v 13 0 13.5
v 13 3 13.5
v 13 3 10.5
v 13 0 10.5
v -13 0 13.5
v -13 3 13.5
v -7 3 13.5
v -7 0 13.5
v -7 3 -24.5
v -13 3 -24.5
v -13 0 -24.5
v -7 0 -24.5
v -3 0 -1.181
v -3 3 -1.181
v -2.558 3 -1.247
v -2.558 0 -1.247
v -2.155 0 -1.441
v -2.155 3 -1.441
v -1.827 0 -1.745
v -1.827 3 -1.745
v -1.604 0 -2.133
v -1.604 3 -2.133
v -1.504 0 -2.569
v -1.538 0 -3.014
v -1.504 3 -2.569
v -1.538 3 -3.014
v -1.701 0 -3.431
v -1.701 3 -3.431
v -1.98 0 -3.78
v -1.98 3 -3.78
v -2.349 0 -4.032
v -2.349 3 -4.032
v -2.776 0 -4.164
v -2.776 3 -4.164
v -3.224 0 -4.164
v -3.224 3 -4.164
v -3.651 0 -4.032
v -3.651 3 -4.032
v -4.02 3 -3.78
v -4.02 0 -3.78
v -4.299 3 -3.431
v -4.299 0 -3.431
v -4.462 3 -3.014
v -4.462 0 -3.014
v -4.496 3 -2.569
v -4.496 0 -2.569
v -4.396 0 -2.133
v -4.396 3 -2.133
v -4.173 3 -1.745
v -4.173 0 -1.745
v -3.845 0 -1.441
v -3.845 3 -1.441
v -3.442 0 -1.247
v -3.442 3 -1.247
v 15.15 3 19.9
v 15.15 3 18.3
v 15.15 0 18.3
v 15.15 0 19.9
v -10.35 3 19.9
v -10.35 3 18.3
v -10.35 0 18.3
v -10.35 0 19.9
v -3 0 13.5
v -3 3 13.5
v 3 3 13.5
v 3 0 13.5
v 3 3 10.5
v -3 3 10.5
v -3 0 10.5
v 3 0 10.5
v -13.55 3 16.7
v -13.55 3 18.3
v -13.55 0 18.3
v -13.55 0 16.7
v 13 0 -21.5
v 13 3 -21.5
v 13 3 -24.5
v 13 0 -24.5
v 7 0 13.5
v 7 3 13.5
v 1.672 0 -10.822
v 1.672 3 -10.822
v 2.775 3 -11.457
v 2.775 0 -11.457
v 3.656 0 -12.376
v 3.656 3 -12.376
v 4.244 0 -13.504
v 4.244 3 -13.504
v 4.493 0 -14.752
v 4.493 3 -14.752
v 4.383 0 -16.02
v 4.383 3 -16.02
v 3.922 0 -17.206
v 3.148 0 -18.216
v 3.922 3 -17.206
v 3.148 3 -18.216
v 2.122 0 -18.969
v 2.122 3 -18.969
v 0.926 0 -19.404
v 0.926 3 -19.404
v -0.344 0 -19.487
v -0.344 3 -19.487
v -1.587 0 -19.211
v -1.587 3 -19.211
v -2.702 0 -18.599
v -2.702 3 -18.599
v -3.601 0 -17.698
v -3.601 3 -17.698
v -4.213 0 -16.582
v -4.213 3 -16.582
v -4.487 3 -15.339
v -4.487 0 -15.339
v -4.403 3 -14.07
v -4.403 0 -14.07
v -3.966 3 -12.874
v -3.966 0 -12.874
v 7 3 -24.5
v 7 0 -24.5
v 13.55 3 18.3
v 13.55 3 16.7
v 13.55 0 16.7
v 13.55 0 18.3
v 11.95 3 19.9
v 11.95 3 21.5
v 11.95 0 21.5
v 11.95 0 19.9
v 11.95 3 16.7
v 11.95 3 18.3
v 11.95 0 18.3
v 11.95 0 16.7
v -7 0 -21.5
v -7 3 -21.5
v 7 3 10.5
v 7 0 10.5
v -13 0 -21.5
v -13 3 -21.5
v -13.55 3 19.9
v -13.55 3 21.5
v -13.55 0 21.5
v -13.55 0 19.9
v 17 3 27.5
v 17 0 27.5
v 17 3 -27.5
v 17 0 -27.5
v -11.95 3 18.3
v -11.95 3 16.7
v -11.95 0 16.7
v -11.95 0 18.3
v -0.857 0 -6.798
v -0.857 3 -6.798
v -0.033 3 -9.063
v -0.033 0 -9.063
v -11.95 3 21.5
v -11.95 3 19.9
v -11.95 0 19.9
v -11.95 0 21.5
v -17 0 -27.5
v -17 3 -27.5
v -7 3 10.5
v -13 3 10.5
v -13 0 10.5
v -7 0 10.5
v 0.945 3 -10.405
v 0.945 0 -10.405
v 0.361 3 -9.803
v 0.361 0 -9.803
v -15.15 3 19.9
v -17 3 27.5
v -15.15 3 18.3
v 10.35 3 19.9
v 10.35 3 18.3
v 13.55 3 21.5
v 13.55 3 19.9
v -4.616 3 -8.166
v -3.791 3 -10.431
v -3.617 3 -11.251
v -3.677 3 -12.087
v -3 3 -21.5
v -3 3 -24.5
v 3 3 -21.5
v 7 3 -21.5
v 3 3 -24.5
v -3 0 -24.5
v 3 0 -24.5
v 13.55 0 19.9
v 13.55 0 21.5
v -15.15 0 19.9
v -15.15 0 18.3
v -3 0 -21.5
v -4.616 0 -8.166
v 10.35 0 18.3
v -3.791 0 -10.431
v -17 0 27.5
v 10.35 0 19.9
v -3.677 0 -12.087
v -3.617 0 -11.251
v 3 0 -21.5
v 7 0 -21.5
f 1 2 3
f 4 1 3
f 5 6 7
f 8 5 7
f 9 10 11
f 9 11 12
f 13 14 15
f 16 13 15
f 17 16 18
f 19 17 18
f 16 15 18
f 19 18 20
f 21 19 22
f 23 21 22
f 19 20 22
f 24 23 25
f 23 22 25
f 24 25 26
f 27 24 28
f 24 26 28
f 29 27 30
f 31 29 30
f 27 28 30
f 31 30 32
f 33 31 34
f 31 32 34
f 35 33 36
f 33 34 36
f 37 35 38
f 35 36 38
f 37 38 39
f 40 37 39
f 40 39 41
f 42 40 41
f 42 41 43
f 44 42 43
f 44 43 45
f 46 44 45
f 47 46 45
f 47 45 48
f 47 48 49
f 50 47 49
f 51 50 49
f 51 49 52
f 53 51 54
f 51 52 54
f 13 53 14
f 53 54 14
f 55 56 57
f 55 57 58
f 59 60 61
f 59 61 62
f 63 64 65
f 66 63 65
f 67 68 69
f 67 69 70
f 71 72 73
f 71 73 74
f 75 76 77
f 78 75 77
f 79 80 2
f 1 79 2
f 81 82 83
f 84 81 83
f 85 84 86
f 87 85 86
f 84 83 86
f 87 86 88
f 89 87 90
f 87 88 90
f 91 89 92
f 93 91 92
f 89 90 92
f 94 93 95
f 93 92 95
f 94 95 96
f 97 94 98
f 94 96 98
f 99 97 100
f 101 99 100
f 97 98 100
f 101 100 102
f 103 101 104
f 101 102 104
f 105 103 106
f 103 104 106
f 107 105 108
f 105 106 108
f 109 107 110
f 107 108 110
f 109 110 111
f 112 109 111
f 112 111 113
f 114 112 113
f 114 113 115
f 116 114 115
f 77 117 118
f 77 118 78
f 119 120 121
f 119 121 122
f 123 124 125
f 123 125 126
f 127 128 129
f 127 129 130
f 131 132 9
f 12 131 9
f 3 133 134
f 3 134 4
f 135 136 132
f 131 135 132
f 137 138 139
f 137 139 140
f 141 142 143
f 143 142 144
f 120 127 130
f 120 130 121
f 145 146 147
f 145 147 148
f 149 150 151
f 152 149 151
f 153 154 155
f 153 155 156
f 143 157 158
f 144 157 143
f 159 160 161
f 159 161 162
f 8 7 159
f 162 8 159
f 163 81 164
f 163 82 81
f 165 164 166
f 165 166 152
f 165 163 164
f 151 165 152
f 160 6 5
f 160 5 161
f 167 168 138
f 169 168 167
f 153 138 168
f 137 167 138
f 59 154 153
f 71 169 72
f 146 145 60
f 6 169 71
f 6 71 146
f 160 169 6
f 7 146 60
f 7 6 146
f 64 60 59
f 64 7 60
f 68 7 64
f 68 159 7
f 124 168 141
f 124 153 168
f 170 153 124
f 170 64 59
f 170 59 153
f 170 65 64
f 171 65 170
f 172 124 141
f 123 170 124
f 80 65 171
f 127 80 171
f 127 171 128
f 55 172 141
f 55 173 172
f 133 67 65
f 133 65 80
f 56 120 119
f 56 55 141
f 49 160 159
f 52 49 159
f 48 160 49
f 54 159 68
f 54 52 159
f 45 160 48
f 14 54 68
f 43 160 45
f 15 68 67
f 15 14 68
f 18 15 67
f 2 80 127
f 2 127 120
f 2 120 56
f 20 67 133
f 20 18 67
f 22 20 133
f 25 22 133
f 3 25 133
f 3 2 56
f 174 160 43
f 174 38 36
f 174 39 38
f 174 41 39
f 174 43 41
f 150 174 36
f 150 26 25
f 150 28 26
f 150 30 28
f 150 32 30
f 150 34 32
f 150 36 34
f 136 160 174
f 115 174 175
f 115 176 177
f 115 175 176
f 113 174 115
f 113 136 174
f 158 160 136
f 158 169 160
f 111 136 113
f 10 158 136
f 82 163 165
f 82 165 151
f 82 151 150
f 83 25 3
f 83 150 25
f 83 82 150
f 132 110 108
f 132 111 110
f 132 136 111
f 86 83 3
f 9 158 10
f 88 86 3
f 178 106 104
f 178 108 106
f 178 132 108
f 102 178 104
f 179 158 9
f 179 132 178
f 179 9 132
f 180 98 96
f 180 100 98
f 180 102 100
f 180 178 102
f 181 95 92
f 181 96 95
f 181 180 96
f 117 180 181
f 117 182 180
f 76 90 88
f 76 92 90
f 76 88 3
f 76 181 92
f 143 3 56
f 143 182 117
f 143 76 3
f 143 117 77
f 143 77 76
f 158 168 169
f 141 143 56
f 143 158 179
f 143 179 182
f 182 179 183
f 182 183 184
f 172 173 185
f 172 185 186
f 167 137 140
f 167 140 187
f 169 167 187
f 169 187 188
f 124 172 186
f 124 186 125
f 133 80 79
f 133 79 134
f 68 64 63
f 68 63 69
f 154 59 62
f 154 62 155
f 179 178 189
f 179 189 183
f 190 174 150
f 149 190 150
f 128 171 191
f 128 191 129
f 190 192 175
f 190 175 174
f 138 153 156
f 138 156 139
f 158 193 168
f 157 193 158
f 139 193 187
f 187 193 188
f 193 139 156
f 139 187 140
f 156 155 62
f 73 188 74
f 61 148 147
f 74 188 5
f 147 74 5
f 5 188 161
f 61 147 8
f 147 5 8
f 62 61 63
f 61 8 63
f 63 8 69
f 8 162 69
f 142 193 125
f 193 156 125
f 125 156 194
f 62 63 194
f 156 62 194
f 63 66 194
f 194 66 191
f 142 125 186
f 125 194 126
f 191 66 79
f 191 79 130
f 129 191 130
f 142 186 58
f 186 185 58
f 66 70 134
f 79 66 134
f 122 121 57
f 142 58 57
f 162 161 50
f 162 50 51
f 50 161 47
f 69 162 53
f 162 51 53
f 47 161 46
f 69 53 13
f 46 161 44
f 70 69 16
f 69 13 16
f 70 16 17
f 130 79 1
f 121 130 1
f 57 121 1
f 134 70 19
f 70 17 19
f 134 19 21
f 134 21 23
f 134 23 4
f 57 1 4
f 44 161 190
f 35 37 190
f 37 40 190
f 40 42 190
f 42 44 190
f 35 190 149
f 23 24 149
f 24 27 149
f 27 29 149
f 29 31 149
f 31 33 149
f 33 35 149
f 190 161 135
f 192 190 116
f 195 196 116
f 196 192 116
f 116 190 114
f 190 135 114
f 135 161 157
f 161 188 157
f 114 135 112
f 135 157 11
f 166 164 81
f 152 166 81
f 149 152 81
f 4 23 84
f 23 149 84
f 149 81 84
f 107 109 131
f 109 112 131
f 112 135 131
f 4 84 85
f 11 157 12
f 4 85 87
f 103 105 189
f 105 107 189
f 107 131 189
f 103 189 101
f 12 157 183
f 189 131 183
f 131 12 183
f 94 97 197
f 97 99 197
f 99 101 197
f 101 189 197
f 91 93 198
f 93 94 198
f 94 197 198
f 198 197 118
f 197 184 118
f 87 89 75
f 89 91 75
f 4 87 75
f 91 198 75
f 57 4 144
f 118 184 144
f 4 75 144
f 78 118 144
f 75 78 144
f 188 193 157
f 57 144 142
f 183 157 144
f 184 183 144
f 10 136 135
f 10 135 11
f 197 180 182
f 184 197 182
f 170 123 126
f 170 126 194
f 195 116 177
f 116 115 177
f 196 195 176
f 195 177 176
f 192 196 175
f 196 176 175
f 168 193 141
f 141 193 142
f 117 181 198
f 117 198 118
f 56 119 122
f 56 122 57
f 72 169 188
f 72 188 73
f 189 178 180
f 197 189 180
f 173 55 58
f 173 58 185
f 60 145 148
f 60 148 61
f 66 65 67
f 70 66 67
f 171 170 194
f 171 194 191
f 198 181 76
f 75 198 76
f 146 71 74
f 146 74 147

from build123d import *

# Parameters (mm, degrees)
SKETCH1_W            = 34
SKETCH1_H            = 55
BOSS_EXTRUDE1_DEPTH  = 3
SKETCH2_R            = 1.5
CUT_EXTRUDE1_DEPTH   = 3
CUT_EXTRUDE4_DEPTH   = 3
LPATTERN1_COUNT      = 2
LPATTERN1_PITCH      = 25.5
SKETCH5_W            = 6
SKETCH5_H            = 3
CUT_EXTRUDE5_DEPTH   = 3
LPATTERN2_COUNT      = 3
LPATTERN2_PITCH      = 10
LPATTERN2_COUNT_DIR2 = 2
LPATTERN2_PITCH_DIR2 = 35
SKETCH6_R            = 4.5
CUT_EXTRUDE6_DEPTH   = 3
CUT_EXTRUDE7_DEPTH   = 3
FILLET9_R            = 3
FILLET10_R           = 3


with BuildPart() as part:
    # Sketch1 → Boss-Extrude1 (new body)
    with BuildSketch(Plane(origin=(0, 0, 0), x_dir=(1, 0, 0), z_dir=(0, 1, 0))):
        Rectangle(SKETCH1_W, SKETCH1_H)
    extrude(amount=BOSS_EXTRUDE1_DEPTH)

    # Sketch2 → Cut-Extrude1 (cut)
    with BuildSketch(Plane(origin=(0, 3, 0), x_dir=(1, 0, 0), z_dir=(0, 1, 0))):
        with Locations(Location((-3, 2.680652708, 0), (0, 0, 270))):
            Circle(SKETCH2_R)
    extrude(amount=-CUT_EXTRUDE1_DEPTH, mode=Mode.SUBTRACT)

    # Sketch4 → Cut-Extrude4 (cut)
    with BuildSketch(Plane(origin=(0, 3, 0), x_dir=(1, 0, 0), z_dir=(0, 1, 0))):
        Polygon((-13.55, -16.7), (-11.95, -16.7), (-11.95, -18.3), (-10.35, -18.3), (-10.35, -19.9), (-11.95, -19.9), (-11.95, -21.5), (-13.55, -21.5), (-13.55, -19.9), (-15.15, -19.9), (-15.15, -18.3), (-13.55, -18.3), align=None)
    cut_extrude4 = extrude(amount=-CUT_EXTRUDE4_DEPTH, mode=Mode.SUBTRACT)

    # LPattern1: Cut-Extrude4 ×2
    with Locations(*[(i * LPATTERN1_PITCH, 0, 0) for i in range(1, LPATTERN1_COUNT)]):
        add(cut_extrude4, mode=Mode.SUBTRACT)

    # Sketch5 → Cut-Extrude5 (cut)
    with BuildSketch(Plane(origin=(0, 3, 0), x_dir=(1, 0, 0), z_dir=(0, 1, 0))):
        with Locations((-10, 23)):
            Rectangle(SKETCH5_W, SKETCH5_H)
    cut_extrude5 = extrude(amount=-CUT_EXTRUDE5_DEPTH, mode=Mode.SUBTRACT)

    # LPattern2: Cut-Extrude5 3 × 2
    with Locations(*[(i * LPATTERN2_PITCH, 0, j * LPATTERN2_PITCH_DIR2) for i in range(LPATTERN2_COUNT) for j in range(LPATTERN2_COUNT_DIR2) if (i, j) != (0, 0)]):
        add(cut_extrude5, mode=Mode.SUBTRACT)

    # Sketch6 → Cut-Extrude6 (cut)
    with BuildSketch(Plane(origin=(0, 3, 0), x_dir=(1, 0, 0), z_dir=(0, 1, 0))):
        with Locations(Location((0, 15, 0), (0, 0, 270))):
            Circle(SKETCH6_R)
    extrude(amount=-CUT_EXTRUDE6_DEPTH, mode=Mode.SUBTRACT)

    # Sketch8 → Cut-Extrude7 (cut)
    with BuildSketch(Plane(origin=(0, 3, 0), x_dir=(1, 0, 0), z_dir=(0, 1, 0))):
        Polygon((0.853324812, 11.496881851), (-2.905445672, 12.864962424), (-4.615546388, 8.16649932), (-0.856775905, 6.798418747), align=None)
    extrude(amount=-CUT_EXTRUDE7_DEPTH, mode=Mode.SUBTRACT)

    # Fillet9
    fillet9_edges = [part.edges().sort_by_distance(p)[0] for p in [
        (-3.258112517, 1.5, -11.89601823),
    ]]
    fillet(fillet9_edges, radius=FILLET9_R)

    # Fillet10
    fillet10_edges = [part.edges().sort_by_distance(p)[0] for p in [
        (0.500657966, 1.5, -10.527937657),
    ]]
    fillet(fillet10_edges, radius=FILLET10_R)


solid = part.part
